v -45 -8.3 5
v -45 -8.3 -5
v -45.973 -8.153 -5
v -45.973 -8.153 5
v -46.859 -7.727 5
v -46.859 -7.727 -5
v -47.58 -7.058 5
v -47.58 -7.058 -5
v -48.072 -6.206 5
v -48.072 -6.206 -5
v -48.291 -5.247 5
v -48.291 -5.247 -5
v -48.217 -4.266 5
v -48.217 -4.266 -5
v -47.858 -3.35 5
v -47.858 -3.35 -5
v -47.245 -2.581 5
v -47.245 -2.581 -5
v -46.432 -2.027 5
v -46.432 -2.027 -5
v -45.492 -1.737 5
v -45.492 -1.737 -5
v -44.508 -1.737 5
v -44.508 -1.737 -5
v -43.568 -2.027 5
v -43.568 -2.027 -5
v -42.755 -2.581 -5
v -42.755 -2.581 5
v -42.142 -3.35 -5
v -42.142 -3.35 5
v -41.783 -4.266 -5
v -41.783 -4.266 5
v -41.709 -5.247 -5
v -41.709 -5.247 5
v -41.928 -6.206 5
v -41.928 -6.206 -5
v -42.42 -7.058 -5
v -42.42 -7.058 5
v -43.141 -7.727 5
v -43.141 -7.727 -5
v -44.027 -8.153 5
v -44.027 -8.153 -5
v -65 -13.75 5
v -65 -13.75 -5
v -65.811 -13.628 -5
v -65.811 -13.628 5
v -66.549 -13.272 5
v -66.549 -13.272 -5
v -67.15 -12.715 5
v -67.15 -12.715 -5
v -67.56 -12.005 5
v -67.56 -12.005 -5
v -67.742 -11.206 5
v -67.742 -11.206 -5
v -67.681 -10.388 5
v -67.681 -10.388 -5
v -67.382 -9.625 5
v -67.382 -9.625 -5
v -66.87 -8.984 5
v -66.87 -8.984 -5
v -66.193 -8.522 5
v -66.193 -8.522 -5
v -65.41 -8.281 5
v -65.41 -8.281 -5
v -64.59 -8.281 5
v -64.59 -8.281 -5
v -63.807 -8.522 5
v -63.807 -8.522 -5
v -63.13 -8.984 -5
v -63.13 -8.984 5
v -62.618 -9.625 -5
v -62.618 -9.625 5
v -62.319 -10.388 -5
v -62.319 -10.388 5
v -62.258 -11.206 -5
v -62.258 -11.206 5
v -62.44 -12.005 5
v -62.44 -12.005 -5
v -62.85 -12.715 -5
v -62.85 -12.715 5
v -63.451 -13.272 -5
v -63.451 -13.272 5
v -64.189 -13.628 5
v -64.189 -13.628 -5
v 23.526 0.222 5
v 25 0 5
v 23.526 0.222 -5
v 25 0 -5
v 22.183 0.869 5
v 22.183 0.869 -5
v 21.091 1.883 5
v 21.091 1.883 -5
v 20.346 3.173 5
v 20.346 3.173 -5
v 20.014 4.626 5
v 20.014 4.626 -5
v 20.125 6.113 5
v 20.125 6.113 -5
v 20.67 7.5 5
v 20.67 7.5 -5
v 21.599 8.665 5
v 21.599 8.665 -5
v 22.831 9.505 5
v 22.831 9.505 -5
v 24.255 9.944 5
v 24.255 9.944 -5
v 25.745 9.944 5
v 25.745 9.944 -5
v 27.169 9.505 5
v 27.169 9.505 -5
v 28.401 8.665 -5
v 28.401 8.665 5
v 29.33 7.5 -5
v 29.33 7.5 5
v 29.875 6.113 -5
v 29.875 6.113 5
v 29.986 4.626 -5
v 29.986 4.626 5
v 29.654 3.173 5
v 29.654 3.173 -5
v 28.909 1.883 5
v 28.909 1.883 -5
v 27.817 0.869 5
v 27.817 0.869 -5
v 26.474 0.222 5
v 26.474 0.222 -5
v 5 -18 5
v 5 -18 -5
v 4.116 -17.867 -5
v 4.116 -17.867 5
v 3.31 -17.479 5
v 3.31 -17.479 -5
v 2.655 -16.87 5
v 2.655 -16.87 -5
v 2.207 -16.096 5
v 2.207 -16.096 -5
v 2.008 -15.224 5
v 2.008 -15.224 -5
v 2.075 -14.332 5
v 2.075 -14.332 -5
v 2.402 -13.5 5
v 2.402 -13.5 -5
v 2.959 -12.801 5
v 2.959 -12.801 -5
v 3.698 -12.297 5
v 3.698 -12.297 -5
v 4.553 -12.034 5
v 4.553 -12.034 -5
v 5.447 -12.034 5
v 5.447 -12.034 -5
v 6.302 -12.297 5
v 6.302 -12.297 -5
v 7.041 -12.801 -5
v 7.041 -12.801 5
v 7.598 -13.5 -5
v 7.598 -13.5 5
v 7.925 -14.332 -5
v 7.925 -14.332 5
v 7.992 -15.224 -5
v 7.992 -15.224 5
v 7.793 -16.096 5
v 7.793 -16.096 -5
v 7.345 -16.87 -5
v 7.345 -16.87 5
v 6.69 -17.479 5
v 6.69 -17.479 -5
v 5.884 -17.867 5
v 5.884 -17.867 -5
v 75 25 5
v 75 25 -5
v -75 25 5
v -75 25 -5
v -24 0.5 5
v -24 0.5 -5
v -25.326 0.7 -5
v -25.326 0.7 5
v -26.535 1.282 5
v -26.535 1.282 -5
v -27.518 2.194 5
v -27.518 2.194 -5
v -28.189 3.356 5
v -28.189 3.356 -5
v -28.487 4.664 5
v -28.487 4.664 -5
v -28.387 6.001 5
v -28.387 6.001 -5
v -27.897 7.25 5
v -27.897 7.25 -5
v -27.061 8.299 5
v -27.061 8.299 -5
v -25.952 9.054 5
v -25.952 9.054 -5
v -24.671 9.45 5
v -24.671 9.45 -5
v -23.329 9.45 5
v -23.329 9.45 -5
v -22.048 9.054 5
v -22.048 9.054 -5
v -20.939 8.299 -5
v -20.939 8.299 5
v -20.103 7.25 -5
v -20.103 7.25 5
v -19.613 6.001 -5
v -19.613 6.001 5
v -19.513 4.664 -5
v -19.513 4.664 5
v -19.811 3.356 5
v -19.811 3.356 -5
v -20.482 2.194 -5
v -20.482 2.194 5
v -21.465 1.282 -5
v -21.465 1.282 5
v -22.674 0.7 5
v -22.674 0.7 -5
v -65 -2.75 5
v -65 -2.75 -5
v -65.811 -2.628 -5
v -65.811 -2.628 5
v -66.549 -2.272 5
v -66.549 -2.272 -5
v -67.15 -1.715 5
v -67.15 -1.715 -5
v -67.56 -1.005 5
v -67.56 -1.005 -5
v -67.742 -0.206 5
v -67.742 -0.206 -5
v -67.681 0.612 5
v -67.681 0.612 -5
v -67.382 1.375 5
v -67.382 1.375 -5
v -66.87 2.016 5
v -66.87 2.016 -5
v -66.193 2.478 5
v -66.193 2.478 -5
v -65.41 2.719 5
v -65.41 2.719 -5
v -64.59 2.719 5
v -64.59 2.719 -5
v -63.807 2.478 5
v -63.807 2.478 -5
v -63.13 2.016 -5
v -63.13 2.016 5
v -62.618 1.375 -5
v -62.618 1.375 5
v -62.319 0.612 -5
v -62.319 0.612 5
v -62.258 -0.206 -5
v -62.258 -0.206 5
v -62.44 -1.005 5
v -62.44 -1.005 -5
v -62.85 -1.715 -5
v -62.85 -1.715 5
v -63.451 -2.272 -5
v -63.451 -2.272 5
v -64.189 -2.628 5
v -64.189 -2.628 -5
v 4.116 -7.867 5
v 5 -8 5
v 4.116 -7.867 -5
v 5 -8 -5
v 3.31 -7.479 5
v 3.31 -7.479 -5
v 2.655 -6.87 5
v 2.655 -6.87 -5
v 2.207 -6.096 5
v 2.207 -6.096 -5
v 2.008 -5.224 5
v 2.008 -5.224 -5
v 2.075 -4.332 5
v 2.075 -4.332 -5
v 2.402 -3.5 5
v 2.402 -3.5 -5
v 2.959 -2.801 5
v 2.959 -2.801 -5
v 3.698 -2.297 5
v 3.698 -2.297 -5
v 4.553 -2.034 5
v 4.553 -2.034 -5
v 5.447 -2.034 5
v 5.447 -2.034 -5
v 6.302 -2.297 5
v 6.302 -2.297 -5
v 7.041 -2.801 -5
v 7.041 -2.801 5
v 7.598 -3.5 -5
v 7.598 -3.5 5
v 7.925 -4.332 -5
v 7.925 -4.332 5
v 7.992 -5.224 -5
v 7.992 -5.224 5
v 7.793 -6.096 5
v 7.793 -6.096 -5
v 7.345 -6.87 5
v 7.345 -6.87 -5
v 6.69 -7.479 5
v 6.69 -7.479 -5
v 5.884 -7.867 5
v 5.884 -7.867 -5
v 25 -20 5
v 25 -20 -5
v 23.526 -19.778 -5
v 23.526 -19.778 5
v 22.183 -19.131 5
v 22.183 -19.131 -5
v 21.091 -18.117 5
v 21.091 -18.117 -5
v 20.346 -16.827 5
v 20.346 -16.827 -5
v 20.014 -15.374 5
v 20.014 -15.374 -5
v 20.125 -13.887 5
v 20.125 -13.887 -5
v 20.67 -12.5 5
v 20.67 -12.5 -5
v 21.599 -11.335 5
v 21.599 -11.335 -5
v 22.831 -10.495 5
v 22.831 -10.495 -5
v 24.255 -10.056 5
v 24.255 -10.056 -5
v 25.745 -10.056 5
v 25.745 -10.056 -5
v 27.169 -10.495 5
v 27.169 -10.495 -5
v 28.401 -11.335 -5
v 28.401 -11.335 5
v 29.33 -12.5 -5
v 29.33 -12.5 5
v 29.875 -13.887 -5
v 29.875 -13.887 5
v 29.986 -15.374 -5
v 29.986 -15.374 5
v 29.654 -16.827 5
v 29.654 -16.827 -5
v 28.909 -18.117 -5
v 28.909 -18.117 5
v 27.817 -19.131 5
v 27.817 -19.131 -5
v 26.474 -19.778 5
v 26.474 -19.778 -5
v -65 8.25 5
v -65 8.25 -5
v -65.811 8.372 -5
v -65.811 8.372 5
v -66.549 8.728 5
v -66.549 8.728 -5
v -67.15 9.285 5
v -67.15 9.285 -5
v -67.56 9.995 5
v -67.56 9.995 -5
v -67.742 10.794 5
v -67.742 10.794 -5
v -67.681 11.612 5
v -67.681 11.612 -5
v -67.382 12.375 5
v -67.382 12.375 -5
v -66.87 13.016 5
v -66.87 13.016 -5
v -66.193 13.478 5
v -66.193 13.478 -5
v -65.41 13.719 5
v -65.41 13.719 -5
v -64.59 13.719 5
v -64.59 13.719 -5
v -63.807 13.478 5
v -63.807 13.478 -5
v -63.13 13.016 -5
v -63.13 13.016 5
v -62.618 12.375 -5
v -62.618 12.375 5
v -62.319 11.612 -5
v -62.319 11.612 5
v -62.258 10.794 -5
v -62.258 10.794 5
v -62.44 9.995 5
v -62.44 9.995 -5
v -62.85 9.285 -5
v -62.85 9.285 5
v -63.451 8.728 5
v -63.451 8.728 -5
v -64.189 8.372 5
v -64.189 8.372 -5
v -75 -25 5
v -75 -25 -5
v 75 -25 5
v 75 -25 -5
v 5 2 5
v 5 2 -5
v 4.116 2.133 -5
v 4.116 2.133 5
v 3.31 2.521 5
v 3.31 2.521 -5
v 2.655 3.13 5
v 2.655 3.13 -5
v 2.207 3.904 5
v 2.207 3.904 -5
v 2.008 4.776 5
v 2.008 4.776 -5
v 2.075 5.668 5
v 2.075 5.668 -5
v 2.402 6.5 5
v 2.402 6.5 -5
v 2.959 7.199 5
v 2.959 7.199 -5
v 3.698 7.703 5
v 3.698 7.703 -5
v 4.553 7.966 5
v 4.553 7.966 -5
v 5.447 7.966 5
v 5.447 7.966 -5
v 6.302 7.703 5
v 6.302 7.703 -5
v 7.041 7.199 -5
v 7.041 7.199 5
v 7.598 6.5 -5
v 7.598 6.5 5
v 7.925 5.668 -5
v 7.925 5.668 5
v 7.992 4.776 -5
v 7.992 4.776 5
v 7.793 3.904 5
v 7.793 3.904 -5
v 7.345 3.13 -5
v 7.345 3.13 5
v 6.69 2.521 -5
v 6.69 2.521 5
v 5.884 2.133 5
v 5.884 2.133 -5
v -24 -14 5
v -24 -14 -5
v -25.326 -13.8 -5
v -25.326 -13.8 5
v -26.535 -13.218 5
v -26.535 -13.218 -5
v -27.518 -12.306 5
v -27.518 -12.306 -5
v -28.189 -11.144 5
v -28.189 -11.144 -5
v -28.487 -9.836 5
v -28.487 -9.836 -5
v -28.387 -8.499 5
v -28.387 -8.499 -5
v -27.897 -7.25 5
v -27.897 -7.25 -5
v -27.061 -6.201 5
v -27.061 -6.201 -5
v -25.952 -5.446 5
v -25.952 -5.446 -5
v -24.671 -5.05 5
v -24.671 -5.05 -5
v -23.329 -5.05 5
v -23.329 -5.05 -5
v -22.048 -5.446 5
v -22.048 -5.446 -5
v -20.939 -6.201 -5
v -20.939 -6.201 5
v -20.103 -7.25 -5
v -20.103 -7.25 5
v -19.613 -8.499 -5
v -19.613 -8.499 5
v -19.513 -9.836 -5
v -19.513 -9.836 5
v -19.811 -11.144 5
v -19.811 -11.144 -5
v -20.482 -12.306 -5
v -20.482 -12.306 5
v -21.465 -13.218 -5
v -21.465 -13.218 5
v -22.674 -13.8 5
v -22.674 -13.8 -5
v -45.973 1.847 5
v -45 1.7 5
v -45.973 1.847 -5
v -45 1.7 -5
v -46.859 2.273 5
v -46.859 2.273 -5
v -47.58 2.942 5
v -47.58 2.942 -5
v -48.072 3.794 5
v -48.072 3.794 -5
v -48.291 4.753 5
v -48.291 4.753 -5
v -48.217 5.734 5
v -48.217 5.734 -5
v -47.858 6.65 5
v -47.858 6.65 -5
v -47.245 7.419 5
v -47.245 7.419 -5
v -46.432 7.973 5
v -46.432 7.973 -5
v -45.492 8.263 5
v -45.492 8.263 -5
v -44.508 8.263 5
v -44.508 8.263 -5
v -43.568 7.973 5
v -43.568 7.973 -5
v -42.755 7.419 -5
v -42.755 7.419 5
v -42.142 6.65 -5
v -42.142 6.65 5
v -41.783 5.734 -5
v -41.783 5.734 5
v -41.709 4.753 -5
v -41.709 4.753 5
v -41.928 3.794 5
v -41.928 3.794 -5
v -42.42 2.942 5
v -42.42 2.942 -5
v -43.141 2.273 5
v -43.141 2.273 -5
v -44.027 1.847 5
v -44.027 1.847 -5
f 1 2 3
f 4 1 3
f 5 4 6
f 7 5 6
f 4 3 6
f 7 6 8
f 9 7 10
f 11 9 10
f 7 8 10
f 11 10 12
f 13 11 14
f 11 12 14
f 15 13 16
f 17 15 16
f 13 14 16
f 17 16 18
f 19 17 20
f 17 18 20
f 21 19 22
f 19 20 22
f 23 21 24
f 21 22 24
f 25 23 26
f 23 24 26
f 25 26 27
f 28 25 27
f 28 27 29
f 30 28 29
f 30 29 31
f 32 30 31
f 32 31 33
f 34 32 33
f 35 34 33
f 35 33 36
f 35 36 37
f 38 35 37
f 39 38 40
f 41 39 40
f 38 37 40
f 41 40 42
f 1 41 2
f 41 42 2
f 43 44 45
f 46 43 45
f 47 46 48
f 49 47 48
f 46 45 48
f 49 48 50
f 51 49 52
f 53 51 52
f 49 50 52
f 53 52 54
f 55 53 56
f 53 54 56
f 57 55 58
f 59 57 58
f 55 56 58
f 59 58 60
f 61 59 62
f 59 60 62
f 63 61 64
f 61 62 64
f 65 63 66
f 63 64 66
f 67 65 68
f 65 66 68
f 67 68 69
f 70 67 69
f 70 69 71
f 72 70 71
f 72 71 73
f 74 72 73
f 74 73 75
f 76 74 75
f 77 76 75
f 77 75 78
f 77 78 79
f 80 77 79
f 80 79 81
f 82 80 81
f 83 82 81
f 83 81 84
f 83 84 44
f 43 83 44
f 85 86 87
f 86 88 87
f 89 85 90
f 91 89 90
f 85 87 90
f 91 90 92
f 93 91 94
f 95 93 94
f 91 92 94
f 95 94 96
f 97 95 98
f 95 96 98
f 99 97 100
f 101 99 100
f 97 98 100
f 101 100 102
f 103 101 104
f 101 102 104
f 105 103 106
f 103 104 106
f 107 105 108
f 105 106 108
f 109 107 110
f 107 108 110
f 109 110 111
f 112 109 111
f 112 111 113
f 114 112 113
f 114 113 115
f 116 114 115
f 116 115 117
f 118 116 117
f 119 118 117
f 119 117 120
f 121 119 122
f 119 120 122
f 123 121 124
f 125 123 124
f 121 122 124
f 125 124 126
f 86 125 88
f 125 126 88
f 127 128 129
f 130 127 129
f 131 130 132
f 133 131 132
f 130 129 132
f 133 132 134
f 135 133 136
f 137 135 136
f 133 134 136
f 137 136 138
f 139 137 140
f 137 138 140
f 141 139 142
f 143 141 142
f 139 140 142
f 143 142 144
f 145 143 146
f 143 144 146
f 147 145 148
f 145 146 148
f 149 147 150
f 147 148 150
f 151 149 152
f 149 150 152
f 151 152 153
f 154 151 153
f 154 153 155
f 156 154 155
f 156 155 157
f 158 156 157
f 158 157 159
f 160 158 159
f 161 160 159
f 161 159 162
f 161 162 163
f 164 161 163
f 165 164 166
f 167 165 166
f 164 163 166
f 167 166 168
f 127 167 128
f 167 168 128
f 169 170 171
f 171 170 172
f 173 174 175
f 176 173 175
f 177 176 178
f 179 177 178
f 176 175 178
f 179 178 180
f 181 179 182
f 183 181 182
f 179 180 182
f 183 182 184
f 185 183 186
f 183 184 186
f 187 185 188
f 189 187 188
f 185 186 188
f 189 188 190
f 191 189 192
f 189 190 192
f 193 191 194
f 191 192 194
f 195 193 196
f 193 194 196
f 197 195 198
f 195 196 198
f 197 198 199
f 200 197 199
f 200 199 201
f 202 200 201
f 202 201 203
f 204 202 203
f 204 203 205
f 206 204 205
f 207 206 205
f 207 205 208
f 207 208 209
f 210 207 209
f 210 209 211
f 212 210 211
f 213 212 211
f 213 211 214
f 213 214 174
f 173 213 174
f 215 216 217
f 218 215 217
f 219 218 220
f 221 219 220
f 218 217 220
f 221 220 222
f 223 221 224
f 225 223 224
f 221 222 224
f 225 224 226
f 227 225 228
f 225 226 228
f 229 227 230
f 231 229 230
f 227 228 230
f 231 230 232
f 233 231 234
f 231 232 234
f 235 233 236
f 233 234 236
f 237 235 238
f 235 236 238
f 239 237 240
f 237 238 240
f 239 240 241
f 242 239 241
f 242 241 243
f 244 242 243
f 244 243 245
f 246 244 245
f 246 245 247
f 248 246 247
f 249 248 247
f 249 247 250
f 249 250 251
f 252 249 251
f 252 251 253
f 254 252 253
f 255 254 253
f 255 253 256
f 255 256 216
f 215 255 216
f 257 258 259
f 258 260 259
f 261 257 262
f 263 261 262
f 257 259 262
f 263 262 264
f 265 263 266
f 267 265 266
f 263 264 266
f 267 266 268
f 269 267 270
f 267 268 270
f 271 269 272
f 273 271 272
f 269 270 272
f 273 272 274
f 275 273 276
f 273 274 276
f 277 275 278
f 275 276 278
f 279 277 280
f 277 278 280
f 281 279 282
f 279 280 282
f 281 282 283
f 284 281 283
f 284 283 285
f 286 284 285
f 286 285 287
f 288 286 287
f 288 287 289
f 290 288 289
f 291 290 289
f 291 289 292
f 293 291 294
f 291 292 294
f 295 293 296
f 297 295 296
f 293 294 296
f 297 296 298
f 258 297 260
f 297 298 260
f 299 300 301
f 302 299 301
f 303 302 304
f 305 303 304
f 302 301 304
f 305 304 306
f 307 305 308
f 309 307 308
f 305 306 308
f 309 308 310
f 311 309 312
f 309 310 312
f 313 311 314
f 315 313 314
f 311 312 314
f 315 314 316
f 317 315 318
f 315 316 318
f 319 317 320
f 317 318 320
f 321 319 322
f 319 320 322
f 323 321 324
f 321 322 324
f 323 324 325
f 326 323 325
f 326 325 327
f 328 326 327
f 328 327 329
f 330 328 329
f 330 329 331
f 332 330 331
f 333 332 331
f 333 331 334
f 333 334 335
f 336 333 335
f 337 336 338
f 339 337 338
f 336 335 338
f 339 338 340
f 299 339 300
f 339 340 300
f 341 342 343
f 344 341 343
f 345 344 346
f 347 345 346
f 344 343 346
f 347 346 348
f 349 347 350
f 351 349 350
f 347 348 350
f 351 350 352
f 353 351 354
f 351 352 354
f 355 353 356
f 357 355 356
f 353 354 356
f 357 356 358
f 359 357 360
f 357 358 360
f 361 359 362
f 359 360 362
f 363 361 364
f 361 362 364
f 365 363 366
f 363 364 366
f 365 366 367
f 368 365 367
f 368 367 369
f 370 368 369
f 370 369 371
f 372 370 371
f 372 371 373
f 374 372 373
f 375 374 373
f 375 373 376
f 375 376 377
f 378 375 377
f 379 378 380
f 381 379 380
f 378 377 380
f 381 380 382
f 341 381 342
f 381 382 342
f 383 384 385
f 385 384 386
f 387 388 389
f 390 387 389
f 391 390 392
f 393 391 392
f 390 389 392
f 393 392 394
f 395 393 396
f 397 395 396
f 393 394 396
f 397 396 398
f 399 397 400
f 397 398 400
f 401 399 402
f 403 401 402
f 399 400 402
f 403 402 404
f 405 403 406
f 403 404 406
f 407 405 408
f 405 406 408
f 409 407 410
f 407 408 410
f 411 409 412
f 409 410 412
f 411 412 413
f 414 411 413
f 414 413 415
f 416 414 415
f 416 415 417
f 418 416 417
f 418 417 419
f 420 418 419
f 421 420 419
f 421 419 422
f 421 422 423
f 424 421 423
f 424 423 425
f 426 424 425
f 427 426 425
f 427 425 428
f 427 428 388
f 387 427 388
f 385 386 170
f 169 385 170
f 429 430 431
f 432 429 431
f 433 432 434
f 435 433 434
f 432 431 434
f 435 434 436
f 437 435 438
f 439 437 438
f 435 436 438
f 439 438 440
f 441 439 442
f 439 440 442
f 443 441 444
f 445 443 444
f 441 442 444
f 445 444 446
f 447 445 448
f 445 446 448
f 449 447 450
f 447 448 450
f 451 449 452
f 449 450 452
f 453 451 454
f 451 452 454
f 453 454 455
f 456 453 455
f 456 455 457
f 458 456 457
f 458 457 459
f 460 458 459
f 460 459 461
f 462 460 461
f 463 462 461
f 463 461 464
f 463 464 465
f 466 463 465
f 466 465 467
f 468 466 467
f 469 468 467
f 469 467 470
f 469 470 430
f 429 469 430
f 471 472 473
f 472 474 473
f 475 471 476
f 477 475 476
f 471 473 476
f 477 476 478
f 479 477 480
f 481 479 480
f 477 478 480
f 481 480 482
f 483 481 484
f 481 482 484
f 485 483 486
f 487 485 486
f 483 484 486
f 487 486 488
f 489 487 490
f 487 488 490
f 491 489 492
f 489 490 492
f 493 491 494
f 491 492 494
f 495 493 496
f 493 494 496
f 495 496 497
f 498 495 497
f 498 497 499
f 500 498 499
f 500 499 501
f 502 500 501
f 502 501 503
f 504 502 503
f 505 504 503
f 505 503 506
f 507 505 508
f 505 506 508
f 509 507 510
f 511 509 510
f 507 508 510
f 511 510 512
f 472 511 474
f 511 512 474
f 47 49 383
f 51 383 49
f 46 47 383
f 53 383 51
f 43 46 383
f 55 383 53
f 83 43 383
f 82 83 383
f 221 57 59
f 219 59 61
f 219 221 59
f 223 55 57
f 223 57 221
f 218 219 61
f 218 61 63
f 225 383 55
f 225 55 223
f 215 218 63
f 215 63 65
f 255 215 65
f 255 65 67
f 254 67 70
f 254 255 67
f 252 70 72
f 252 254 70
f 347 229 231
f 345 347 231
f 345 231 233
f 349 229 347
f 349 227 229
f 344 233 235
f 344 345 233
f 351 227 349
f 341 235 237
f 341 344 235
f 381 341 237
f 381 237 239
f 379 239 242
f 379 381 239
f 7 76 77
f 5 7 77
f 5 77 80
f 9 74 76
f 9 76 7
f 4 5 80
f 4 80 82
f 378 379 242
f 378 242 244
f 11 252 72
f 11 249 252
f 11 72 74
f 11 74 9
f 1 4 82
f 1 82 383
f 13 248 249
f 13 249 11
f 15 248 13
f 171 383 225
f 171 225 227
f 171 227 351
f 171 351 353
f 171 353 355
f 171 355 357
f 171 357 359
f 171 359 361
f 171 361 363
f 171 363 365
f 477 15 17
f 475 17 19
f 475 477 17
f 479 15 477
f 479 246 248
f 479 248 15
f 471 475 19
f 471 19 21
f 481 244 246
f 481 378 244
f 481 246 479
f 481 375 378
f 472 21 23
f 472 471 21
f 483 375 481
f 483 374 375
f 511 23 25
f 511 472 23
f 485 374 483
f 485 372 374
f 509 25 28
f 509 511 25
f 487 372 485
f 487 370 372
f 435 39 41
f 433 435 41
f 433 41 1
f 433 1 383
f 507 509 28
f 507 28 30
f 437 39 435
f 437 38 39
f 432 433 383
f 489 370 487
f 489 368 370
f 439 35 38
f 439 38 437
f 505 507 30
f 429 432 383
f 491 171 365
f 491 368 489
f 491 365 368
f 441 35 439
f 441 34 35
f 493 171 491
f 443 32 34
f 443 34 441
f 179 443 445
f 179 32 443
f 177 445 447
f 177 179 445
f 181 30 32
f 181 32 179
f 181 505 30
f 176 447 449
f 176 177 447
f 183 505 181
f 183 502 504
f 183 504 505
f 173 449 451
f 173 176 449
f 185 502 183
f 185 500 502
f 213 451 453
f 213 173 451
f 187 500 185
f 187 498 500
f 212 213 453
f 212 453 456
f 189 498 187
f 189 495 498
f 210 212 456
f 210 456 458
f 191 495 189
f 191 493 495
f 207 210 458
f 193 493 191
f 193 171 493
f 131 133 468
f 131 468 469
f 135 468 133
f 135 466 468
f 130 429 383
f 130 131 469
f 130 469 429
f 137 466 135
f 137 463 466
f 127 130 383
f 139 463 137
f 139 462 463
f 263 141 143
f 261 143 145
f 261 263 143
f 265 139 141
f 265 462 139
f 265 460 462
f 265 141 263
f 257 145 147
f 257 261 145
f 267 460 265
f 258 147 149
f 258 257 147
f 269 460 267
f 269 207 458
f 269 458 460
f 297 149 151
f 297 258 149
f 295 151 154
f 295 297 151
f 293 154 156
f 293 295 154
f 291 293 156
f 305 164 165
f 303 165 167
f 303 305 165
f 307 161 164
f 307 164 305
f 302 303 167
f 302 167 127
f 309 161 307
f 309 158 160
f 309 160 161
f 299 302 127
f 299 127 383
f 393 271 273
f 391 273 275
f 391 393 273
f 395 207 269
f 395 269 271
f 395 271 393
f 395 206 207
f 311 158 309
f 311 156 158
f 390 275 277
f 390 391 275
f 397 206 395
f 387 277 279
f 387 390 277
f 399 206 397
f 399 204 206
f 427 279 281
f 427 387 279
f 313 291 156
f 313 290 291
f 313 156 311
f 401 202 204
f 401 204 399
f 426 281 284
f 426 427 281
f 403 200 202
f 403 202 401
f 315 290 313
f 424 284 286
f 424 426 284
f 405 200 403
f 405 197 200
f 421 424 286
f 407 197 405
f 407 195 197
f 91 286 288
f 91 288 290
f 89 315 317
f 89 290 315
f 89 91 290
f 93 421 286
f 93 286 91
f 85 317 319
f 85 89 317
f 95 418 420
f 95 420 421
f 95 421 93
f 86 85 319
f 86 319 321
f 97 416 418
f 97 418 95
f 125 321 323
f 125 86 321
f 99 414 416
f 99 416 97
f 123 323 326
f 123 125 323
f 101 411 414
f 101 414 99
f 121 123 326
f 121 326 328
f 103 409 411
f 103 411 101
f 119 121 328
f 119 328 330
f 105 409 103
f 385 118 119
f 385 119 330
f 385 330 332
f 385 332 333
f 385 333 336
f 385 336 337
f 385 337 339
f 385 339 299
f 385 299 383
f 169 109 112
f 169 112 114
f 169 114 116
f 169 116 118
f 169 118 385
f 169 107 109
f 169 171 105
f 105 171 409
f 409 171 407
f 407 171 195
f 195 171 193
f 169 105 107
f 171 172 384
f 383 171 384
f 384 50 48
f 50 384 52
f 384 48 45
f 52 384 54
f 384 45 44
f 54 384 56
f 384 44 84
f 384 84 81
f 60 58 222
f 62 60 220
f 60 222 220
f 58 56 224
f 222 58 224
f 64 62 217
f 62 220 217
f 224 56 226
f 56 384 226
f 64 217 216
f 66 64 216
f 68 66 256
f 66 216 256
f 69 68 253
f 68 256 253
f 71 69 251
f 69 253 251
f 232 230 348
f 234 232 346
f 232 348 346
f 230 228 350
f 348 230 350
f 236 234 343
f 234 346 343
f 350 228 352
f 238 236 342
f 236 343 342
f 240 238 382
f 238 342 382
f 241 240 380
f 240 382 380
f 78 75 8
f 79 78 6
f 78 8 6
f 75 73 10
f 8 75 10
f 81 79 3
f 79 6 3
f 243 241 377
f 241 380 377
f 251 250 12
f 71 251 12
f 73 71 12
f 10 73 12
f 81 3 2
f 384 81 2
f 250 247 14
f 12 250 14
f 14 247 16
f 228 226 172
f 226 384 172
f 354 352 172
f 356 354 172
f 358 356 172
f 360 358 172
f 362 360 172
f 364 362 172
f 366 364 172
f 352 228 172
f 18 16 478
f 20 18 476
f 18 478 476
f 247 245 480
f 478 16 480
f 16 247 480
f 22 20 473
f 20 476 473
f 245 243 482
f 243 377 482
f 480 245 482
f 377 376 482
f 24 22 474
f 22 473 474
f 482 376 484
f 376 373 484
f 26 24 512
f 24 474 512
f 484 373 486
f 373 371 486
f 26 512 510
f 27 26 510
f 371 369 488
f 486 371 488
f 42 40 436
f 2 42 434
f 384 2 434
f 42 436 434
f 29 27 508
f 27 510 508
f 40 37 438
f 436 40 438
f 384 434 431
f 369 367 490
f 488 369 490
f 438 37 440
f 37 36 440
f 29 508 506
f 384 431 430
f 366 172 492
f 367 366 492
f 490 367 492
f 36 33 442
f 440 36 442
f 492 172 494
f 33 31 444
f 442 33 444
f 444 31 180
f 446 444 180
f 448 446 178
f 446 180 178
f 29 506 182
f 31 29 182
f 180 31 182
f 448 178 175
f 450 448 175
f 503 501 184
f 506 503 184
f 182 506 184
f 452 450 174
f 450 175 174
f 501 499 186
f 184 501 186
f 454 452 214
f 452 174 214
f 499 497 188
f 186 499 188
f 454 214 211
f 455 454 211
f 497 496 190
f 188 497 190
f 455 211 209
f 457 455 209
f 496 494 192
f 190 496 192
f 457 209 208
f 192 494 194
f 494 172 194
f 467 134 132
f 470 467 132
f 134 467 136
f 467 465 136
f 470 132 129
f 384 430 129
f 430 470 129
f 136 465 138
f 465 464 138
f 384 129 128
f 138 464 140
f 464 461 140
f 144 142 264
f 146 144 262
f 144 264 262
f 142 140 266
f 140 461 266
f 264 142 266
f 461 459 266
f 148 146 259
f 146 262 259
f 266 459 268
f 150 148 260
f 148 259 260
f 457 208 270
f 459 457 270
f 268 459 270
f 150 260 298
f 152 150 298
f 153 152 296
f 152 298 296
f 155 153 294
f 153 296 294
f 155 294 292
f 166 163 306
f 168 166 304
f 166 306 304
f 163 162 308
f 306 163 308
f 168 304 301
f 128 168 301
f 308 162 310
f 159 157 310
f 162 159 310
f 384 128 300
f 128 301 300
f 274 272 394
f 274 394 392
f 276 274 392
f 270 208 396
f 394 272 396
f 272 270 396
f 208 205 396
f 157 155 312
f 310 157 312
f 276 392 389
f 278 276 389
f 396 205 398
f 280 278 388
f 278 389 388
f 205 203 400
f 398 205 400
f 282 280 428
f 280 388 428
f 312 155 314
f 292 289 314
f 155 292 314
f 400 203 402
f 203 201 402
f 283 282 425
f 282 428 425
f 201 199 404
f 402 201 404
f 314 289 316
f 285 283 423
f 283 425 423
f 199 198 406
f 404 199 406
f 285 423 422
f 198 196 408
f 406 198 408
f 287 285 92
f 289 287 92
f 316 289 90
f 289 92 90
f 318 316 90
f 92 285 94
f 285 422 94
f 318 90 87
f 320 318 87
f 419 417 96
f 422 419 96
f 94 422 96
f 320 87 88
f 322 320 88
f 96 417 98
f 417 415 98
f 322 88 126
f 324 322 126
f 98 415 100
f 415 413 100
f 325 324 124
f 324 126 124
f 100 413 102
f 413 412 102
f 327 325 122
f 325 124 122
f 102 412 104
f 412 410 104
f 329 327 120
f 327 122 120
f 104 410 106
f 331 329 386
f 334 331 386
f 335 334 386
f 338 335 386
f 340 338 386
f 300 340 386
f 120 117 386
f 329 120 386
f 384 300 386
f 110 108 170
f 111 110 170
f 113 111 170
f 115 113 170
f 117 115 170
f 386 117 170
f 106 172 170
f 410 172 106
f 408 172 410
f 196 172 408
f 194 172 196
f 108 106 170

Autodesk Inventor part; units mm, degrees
ref_plane "YZ Plane" through (0, 0, 0) normal (1, 0, 0) x (0, 1, 0)
ref_plane "XZ Plane" through (0, 0, 0) normal (0, 1, 0) x (-1, 0, 0)
ref_plane "XY Plane" through (0, 0, 0) normal (0, 0, 1) x (1, 0, 0)
sketch "Sketch2" plane through (0, 0, 0) normal (0, 0, 1) x (1, 0, 0)
  line L0 (-75, -25) -> (75, -25)
  line L1 (75, -25) -> (75, 25)
  line L2 (75, 25) -> (-75, 25)
  line L3 (-75, 25) -> (-75, -25)
  line L4 (-75, -25) -> (75, 25) construction
  line L5 (75, -25) -> (-75, 25) construction
  point P0 (0, 0)
  dimension "d1" = 150
  dimension "d2" = 50
extrude "Extrusion1" add sketch "Sketch2" along normal mid plane 10
sketch "Sketch3" plane through (0, 0, 5) normal (0, 0, 1) x (1, 0, 0)
  line L0 (-75, 25) -> (-75, -25) projected
  line L1 (75, 25) -> (-75, 25) projected
  point P0 (0, 0)
  point P1 (-65, 0)
  dimension "d40" = 10
  dimension "d43" = 25
hole "Hole1" at (-65, 0, 5) direction (0, 0, -1) diameter 5.5 depth 14.2 tip angle 118 clearance for "Socket Head Cap Screw" size "M5" standard "TS Profile"
sketch "Sketch4" plane through (0, 0, 5) normal (0, 0, 1) x (1, 0, 0)
  line L0 (-75, 25) -> (-75, -25) projected
  line L1 (75, 25) -> (-75, 25) projected
  point P0 (0, 0)
  point P1 (-45, 5)
  dimension "d41" = 30
  dimension "d42" = 20
hole "Hole2" at (-45, 5, 5) direction (0, 0, -1) diameter 6.6 depth 14.2 tip angle 118 clearance for "Socket Head Cap Screw" size "M6" standard "TS Profile"
sketch "Sketch5" plane through (0, 0, 5) normal (0, 0, 1) x (1, 0, 0)
  line L0 (-75, 25) -> (-75, -25) projected
  line L1 (75, 25) -> (-75, 25) projected
  point P0 (0, 0)
  point P1 (-24, 5)
  dimension "d44" = 51
  dimension "d45" = 20
hole "Hole3" at (-24, 5, 5) direction (0, 0, -1) diameter 9 depth 14.2 tip angle 118 clearance for "Socket Head Cap Screw" size "M8" standard "TS Profile"
sketch "Sketch6" plane through (0, 0, 5) normal (0, 0, 1) x (1, 0, 0)
  line L0 (-75, 25) -> (-75, -25) projected
  line L1 (75, 25) -> (-75, 25) projected
  point P0 (0, 0)
  point P1 (5, 5)
  dimension "d46" = 80
  dimension "d47" = 20
hole "Hole4" at (5, 5, 5) direction (0, 0, -1) diameter 6 depth 14.2 tip angle 118
sketch "Sketch7" plane through (0, 0, 5) normal (0, 0, 1) x (1, 0, 0)
  line L0 (-75, 25) -> (-75, -25) projected
  line L1 (75, 25) -> (-75, 25) projected
  point P0 (0, 0)
  point P1 (25, 5)
  dimension "d48" = 100
  dimension "d49" = 20
hole "Hole5" at (25, 5, 5) direction (0, 0, -1) diameter 10 depth 14.2 tip angle 118
pattern_linear "Rectangular Pattern1" count 3 spacing 11 along (0, -1, 0) of "Hole1" first direction both ways yes
pattern_linear "Rectangular Pattern2" count 2 spacing 10 along (0, -1, 0) of "Hole2"
pattern_linear "Rectangular Pattern3" count 2 spacing 14.5 along (0, -1, 0) of "Hole3"
pattern_linear "Rectangular Pattern4" count 3 spacing 10 along (0, -1, 0) of "Hole4"
pattern_linear "Rectangular Pattern5" count 2 spacing 20 along (0, -1, 0) of "Hole5"
properties part number "홀간 거리 확인 파트-9" material "SS400"
